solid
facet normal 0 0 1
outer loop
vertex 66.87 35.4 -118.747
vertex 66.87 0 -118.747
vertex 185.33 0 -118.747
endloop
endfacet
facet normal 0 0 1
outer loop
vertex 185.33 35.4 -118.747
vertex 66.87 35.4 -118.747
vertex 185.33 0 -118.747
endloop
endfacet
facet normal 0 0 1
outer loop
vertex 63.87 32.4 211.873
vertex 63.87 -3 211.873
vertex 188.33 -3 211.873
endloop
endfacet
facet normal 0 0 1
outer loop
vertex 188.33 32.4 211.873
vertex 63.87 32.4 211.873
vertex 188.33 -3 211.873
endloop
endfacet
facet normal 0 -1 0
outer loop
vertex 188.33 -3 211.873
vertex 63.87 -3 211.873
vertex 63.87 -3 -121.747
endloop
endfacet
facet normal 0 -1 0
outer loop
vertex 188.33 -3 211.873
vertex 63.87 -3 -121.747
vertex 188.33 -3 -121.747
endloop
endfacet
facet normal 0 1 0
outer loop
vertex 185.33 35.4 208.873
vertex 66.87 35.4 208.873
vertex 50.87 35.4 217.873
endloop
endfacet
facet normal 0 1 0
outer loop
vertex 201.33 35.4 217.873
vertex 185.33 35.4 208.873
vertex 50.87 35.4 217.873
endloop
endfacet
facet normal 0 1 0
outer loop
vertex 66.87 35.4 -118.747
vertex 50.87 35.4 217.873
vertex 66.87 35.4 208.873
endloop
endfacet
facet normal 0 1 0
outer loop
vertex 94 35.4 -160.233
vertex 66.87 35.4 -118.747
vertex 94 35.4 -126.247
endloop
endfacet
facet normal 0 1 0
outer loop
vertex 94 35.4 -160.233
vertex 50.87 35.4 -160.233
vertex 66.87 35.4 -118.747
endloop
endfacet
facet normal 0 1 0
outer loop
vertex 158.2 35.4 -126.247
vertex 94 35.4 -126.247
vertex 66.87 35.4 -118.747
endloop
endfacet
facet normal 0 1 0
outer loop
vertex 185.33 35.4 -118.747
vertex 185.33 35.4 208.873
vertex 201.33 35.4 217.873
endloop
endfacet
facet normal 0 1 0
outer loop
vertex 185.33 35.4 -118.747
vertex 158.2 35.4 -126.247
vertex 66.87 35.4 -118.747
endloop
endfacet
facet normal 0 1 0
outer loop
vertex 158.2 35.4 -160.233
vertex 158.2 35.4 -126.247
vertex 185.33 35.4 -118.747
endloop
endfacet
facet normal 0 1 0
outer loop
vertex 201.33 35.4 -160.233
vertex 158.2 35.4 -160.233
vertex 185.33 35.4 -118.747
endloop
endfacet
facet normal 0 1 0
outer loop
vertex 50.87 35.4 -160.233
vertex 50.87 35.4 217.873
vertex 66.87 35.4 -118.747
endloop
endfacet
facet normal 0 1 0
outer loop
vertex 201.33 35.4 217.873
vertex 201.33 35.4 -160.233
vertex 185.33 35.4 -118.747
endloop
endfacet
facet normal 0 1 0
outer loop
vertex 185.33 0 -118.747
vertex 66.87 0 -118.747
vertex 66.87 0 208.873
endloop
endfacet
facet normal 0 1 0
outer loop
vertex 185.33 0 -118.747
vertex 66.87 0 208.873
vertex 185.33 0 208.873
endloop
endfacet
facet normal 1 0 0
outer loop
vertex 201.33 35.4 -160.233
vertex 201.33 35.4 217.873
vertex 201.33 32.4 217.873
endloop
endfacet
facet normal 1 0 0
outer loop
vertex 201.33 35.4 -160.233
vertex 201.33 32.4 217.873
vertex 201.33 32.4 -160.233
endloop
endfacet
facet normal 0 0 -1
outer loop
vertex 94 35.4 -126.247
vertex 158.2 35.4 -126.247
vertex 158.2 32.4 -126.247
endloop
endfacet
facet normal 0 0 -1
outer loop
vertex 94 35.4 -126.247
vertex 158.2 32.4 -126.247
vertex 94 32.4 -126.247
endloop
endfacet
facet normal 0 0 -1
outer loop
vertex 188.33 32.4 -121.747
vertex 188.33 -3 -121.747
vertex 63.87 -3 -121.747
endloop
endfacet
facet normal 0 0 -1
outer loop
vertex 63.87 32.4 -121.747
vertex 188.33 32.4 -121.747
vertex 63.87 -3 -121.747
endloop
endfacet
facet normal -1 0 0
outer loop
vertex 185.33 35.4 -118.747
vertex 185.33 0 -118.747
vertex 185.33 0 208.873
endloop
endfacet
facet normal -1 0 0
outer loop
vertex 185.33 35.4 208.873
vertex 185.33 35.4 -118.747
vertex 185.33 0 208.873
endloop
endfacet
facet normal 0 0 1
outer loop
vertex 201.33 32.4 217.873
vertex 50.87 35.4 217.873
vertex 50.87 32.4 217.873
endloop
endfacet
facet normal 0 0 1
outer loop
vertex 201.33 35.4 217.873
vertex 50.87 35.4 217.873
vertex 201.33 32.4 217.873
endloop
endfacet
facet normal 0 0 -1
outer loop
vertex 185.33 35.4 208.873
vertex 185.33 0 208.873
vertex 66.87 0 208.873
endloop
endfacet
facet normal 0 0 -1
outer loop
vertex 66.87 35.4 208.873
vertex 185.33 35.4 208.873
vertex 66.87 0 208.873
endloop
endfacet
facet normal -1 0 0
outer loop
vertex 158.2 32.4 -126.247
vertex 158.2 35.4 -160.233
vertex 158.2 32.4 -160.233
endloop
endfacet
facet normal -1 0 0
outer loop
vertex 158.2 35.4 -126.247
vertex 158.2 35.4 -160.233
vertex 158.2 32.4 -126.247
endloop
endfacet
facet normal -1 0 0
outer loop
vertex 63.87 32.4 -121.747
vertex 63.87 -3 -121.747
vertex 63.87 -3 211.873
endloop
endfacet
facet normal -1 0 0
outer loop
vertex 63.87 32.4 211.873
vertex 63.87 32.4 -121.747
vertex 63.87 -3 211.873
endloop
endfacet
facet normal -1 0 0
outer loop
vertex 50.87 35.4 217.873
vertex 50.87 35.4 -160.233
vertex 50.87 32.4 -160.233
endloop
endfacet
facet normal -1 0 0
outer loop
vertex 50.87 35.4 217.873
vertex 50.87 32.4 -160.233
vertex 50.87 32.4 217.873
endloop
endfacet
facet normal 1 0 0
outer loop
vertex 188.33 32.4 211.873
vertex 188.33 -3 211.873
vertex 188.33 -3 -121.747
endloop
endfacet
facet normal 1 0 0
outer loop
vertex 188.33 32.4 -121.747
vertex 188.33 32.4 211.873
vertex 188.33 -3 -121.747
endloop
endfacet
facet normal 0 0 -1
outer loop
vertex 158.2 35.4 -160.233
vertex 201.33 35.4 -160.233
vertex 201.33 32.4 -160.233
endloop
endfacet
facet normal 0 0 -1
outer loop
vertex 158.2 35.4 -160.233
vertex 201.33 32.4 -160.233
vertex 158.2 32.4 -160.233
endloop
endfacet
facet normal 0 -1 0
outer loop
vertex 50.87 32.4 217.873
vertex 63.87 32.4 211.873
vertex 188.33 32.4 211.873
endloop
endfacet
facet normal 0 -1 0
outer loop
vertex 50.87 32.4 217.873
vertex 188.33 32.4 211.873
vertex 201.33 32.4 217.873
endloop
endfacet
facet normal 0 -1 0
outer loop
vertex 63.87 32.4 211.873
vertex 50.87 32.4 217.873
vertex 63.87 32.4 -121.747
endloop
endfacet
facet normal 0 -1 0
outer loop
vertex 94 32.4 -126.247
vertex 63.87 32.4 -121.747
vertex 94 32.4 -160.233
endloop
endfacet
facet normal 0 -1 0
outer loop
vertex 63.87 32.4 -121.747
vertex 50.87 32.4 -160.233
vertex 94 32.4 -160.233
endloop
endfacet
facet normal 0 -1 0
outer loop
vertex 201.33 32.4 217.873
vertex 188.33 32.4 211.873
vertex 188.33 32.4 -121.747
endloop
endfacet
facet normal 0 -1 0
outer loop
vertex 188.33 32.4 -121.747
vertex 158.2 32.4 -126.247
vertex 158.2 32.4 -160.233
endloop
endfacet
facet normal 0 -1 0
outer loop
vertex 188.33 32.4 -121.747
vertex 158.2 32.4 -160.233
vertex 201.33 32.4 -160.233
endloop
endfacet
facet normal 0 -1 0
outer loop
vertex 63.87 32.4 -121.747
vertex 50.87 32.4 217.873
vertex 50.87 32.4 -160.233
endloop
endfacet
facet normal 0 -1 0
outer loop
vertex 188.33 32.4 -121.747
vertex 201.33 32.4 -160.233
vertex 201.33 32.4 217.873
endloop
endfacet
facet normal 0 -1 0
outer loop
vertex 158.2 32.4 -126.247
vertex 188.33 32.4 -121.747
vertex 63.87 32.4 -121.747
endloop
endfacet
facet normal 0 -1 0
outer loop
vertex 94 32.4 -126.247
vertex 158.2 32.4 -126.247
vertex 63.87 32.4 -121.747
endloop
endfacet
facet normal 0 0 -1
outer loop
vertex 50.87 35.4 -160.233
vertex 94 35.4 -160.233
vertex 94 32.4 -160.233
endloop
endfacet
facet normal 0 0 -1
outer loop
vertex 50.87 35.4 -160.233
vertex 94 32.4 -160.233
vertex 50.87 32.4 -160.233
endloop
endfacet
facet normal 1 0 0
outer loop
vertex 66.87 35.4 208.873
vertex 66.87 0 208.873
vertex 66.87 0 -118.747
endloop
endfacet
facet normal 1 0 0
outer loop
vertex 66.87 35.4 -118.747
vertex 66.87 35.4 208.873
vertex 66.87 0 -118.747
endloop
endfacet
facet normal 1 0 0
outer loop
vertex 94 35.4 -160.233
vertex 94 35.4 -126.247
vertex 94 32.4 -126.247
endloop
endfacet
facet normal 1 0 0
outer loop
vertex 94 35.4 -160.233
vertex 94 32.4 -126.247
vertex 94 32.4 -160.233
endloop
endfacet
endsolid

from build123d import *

# Parameters (mm, degrees)
BASE_FLANGE1_DEPTH  = 3
BOSS_EXTRUDE1_DEPTH = 35.4
BOSS_EXTRUDE2_DEPTH = 3


# Sheet-metal steps are written as plain solids
with BuildPart() as part:
    # Sketch1 → Base-Flange1 (new body)
    with BuildSketch(Plane(origin=(0, 0, 0), x_dir=(1, 0, 0), z_dir=(0, 1, 0))):
        Polygon((63.869646018, 121.746556797), (63.869646018, -211.873486949), (188.329646018, -211.873486949), (188.329646018, 121.746556797), (164.199646018, 121.746556797), (87.999646018, 121.746556797), align=None)
    extrude(amount=-BASE_FLANGE1_DEPTH)

    # Sketch75 → Boss-Extrude1 (add)
    with BuildSketch(Plane(origin=(0, 0, 0), x_dir=(1, 0, 0), z_dir=(0, 1, 0))):
        Polygon((188.329646018, -193.287020835), (188.329646018, 121.746556797), (185.329646018, 121.746556797), (164.199646018, 121.746556797), (87.999646018, 121.746556797), (63.869646018, 121.746556797), (63.869646018, -211.873486949), (66.869646018, -211.873486949), (188.329646018, -211.873486949), align=None)
        Polygon((167.199646018, 118.746556797), (185.329646018, 118.746556797), (185.329646018, -208.873486949), (66.869646018, -208.873486949), (66.869646018, 118.746556797), (84.999646018, 118.746556797), (87.999646018, 118.746556797), (164.199646018, 118.746556797), align=None, mode=Mode.SUBTRACT)
    extrude(amount=BOSS_EXTRUDE1_DEPTH)

    # Sketch76 → Boss-Extrude2 (add)
    with BuildSketch(Plane(origin=(0, 35.4, 0), x_dir=(1, 0, 0), z_dir=(0, 1, 0))):
        Polygon((188.329646018, 160.232979165), (168.60717256, 160.232979165), (158.199646018, 160.232979165), (158.199646018, 126.246556797), (93.999646018, 126.246556797), (93.999646018, 154.232979165), (93.999646018, 160.232979165), (61.173757876, 160.232979165), (50.869646018, 160.232979165), (50.869646018, -212.840780944), (50.869646018, -217.873486949), (190.329646018, -217.873486949), (201.329646018, -217.873486949), (201.329646018, 160.232979165), align=None)
        Polygon((63.869646018, -211.873486949), (63.869646018, 121.746556797), (87.999646018, 121.746556797), (142.998933393, 121.746556797), (164.199646018, 121.746556797), (188.329646018, 121.746556797), (188.329646018, -211.873486949), align=None, mode=Mode.SUBTRACT)
    extrude(amount=-BOSS_EXTRUDE2_DEPTH)


solid = part.part
